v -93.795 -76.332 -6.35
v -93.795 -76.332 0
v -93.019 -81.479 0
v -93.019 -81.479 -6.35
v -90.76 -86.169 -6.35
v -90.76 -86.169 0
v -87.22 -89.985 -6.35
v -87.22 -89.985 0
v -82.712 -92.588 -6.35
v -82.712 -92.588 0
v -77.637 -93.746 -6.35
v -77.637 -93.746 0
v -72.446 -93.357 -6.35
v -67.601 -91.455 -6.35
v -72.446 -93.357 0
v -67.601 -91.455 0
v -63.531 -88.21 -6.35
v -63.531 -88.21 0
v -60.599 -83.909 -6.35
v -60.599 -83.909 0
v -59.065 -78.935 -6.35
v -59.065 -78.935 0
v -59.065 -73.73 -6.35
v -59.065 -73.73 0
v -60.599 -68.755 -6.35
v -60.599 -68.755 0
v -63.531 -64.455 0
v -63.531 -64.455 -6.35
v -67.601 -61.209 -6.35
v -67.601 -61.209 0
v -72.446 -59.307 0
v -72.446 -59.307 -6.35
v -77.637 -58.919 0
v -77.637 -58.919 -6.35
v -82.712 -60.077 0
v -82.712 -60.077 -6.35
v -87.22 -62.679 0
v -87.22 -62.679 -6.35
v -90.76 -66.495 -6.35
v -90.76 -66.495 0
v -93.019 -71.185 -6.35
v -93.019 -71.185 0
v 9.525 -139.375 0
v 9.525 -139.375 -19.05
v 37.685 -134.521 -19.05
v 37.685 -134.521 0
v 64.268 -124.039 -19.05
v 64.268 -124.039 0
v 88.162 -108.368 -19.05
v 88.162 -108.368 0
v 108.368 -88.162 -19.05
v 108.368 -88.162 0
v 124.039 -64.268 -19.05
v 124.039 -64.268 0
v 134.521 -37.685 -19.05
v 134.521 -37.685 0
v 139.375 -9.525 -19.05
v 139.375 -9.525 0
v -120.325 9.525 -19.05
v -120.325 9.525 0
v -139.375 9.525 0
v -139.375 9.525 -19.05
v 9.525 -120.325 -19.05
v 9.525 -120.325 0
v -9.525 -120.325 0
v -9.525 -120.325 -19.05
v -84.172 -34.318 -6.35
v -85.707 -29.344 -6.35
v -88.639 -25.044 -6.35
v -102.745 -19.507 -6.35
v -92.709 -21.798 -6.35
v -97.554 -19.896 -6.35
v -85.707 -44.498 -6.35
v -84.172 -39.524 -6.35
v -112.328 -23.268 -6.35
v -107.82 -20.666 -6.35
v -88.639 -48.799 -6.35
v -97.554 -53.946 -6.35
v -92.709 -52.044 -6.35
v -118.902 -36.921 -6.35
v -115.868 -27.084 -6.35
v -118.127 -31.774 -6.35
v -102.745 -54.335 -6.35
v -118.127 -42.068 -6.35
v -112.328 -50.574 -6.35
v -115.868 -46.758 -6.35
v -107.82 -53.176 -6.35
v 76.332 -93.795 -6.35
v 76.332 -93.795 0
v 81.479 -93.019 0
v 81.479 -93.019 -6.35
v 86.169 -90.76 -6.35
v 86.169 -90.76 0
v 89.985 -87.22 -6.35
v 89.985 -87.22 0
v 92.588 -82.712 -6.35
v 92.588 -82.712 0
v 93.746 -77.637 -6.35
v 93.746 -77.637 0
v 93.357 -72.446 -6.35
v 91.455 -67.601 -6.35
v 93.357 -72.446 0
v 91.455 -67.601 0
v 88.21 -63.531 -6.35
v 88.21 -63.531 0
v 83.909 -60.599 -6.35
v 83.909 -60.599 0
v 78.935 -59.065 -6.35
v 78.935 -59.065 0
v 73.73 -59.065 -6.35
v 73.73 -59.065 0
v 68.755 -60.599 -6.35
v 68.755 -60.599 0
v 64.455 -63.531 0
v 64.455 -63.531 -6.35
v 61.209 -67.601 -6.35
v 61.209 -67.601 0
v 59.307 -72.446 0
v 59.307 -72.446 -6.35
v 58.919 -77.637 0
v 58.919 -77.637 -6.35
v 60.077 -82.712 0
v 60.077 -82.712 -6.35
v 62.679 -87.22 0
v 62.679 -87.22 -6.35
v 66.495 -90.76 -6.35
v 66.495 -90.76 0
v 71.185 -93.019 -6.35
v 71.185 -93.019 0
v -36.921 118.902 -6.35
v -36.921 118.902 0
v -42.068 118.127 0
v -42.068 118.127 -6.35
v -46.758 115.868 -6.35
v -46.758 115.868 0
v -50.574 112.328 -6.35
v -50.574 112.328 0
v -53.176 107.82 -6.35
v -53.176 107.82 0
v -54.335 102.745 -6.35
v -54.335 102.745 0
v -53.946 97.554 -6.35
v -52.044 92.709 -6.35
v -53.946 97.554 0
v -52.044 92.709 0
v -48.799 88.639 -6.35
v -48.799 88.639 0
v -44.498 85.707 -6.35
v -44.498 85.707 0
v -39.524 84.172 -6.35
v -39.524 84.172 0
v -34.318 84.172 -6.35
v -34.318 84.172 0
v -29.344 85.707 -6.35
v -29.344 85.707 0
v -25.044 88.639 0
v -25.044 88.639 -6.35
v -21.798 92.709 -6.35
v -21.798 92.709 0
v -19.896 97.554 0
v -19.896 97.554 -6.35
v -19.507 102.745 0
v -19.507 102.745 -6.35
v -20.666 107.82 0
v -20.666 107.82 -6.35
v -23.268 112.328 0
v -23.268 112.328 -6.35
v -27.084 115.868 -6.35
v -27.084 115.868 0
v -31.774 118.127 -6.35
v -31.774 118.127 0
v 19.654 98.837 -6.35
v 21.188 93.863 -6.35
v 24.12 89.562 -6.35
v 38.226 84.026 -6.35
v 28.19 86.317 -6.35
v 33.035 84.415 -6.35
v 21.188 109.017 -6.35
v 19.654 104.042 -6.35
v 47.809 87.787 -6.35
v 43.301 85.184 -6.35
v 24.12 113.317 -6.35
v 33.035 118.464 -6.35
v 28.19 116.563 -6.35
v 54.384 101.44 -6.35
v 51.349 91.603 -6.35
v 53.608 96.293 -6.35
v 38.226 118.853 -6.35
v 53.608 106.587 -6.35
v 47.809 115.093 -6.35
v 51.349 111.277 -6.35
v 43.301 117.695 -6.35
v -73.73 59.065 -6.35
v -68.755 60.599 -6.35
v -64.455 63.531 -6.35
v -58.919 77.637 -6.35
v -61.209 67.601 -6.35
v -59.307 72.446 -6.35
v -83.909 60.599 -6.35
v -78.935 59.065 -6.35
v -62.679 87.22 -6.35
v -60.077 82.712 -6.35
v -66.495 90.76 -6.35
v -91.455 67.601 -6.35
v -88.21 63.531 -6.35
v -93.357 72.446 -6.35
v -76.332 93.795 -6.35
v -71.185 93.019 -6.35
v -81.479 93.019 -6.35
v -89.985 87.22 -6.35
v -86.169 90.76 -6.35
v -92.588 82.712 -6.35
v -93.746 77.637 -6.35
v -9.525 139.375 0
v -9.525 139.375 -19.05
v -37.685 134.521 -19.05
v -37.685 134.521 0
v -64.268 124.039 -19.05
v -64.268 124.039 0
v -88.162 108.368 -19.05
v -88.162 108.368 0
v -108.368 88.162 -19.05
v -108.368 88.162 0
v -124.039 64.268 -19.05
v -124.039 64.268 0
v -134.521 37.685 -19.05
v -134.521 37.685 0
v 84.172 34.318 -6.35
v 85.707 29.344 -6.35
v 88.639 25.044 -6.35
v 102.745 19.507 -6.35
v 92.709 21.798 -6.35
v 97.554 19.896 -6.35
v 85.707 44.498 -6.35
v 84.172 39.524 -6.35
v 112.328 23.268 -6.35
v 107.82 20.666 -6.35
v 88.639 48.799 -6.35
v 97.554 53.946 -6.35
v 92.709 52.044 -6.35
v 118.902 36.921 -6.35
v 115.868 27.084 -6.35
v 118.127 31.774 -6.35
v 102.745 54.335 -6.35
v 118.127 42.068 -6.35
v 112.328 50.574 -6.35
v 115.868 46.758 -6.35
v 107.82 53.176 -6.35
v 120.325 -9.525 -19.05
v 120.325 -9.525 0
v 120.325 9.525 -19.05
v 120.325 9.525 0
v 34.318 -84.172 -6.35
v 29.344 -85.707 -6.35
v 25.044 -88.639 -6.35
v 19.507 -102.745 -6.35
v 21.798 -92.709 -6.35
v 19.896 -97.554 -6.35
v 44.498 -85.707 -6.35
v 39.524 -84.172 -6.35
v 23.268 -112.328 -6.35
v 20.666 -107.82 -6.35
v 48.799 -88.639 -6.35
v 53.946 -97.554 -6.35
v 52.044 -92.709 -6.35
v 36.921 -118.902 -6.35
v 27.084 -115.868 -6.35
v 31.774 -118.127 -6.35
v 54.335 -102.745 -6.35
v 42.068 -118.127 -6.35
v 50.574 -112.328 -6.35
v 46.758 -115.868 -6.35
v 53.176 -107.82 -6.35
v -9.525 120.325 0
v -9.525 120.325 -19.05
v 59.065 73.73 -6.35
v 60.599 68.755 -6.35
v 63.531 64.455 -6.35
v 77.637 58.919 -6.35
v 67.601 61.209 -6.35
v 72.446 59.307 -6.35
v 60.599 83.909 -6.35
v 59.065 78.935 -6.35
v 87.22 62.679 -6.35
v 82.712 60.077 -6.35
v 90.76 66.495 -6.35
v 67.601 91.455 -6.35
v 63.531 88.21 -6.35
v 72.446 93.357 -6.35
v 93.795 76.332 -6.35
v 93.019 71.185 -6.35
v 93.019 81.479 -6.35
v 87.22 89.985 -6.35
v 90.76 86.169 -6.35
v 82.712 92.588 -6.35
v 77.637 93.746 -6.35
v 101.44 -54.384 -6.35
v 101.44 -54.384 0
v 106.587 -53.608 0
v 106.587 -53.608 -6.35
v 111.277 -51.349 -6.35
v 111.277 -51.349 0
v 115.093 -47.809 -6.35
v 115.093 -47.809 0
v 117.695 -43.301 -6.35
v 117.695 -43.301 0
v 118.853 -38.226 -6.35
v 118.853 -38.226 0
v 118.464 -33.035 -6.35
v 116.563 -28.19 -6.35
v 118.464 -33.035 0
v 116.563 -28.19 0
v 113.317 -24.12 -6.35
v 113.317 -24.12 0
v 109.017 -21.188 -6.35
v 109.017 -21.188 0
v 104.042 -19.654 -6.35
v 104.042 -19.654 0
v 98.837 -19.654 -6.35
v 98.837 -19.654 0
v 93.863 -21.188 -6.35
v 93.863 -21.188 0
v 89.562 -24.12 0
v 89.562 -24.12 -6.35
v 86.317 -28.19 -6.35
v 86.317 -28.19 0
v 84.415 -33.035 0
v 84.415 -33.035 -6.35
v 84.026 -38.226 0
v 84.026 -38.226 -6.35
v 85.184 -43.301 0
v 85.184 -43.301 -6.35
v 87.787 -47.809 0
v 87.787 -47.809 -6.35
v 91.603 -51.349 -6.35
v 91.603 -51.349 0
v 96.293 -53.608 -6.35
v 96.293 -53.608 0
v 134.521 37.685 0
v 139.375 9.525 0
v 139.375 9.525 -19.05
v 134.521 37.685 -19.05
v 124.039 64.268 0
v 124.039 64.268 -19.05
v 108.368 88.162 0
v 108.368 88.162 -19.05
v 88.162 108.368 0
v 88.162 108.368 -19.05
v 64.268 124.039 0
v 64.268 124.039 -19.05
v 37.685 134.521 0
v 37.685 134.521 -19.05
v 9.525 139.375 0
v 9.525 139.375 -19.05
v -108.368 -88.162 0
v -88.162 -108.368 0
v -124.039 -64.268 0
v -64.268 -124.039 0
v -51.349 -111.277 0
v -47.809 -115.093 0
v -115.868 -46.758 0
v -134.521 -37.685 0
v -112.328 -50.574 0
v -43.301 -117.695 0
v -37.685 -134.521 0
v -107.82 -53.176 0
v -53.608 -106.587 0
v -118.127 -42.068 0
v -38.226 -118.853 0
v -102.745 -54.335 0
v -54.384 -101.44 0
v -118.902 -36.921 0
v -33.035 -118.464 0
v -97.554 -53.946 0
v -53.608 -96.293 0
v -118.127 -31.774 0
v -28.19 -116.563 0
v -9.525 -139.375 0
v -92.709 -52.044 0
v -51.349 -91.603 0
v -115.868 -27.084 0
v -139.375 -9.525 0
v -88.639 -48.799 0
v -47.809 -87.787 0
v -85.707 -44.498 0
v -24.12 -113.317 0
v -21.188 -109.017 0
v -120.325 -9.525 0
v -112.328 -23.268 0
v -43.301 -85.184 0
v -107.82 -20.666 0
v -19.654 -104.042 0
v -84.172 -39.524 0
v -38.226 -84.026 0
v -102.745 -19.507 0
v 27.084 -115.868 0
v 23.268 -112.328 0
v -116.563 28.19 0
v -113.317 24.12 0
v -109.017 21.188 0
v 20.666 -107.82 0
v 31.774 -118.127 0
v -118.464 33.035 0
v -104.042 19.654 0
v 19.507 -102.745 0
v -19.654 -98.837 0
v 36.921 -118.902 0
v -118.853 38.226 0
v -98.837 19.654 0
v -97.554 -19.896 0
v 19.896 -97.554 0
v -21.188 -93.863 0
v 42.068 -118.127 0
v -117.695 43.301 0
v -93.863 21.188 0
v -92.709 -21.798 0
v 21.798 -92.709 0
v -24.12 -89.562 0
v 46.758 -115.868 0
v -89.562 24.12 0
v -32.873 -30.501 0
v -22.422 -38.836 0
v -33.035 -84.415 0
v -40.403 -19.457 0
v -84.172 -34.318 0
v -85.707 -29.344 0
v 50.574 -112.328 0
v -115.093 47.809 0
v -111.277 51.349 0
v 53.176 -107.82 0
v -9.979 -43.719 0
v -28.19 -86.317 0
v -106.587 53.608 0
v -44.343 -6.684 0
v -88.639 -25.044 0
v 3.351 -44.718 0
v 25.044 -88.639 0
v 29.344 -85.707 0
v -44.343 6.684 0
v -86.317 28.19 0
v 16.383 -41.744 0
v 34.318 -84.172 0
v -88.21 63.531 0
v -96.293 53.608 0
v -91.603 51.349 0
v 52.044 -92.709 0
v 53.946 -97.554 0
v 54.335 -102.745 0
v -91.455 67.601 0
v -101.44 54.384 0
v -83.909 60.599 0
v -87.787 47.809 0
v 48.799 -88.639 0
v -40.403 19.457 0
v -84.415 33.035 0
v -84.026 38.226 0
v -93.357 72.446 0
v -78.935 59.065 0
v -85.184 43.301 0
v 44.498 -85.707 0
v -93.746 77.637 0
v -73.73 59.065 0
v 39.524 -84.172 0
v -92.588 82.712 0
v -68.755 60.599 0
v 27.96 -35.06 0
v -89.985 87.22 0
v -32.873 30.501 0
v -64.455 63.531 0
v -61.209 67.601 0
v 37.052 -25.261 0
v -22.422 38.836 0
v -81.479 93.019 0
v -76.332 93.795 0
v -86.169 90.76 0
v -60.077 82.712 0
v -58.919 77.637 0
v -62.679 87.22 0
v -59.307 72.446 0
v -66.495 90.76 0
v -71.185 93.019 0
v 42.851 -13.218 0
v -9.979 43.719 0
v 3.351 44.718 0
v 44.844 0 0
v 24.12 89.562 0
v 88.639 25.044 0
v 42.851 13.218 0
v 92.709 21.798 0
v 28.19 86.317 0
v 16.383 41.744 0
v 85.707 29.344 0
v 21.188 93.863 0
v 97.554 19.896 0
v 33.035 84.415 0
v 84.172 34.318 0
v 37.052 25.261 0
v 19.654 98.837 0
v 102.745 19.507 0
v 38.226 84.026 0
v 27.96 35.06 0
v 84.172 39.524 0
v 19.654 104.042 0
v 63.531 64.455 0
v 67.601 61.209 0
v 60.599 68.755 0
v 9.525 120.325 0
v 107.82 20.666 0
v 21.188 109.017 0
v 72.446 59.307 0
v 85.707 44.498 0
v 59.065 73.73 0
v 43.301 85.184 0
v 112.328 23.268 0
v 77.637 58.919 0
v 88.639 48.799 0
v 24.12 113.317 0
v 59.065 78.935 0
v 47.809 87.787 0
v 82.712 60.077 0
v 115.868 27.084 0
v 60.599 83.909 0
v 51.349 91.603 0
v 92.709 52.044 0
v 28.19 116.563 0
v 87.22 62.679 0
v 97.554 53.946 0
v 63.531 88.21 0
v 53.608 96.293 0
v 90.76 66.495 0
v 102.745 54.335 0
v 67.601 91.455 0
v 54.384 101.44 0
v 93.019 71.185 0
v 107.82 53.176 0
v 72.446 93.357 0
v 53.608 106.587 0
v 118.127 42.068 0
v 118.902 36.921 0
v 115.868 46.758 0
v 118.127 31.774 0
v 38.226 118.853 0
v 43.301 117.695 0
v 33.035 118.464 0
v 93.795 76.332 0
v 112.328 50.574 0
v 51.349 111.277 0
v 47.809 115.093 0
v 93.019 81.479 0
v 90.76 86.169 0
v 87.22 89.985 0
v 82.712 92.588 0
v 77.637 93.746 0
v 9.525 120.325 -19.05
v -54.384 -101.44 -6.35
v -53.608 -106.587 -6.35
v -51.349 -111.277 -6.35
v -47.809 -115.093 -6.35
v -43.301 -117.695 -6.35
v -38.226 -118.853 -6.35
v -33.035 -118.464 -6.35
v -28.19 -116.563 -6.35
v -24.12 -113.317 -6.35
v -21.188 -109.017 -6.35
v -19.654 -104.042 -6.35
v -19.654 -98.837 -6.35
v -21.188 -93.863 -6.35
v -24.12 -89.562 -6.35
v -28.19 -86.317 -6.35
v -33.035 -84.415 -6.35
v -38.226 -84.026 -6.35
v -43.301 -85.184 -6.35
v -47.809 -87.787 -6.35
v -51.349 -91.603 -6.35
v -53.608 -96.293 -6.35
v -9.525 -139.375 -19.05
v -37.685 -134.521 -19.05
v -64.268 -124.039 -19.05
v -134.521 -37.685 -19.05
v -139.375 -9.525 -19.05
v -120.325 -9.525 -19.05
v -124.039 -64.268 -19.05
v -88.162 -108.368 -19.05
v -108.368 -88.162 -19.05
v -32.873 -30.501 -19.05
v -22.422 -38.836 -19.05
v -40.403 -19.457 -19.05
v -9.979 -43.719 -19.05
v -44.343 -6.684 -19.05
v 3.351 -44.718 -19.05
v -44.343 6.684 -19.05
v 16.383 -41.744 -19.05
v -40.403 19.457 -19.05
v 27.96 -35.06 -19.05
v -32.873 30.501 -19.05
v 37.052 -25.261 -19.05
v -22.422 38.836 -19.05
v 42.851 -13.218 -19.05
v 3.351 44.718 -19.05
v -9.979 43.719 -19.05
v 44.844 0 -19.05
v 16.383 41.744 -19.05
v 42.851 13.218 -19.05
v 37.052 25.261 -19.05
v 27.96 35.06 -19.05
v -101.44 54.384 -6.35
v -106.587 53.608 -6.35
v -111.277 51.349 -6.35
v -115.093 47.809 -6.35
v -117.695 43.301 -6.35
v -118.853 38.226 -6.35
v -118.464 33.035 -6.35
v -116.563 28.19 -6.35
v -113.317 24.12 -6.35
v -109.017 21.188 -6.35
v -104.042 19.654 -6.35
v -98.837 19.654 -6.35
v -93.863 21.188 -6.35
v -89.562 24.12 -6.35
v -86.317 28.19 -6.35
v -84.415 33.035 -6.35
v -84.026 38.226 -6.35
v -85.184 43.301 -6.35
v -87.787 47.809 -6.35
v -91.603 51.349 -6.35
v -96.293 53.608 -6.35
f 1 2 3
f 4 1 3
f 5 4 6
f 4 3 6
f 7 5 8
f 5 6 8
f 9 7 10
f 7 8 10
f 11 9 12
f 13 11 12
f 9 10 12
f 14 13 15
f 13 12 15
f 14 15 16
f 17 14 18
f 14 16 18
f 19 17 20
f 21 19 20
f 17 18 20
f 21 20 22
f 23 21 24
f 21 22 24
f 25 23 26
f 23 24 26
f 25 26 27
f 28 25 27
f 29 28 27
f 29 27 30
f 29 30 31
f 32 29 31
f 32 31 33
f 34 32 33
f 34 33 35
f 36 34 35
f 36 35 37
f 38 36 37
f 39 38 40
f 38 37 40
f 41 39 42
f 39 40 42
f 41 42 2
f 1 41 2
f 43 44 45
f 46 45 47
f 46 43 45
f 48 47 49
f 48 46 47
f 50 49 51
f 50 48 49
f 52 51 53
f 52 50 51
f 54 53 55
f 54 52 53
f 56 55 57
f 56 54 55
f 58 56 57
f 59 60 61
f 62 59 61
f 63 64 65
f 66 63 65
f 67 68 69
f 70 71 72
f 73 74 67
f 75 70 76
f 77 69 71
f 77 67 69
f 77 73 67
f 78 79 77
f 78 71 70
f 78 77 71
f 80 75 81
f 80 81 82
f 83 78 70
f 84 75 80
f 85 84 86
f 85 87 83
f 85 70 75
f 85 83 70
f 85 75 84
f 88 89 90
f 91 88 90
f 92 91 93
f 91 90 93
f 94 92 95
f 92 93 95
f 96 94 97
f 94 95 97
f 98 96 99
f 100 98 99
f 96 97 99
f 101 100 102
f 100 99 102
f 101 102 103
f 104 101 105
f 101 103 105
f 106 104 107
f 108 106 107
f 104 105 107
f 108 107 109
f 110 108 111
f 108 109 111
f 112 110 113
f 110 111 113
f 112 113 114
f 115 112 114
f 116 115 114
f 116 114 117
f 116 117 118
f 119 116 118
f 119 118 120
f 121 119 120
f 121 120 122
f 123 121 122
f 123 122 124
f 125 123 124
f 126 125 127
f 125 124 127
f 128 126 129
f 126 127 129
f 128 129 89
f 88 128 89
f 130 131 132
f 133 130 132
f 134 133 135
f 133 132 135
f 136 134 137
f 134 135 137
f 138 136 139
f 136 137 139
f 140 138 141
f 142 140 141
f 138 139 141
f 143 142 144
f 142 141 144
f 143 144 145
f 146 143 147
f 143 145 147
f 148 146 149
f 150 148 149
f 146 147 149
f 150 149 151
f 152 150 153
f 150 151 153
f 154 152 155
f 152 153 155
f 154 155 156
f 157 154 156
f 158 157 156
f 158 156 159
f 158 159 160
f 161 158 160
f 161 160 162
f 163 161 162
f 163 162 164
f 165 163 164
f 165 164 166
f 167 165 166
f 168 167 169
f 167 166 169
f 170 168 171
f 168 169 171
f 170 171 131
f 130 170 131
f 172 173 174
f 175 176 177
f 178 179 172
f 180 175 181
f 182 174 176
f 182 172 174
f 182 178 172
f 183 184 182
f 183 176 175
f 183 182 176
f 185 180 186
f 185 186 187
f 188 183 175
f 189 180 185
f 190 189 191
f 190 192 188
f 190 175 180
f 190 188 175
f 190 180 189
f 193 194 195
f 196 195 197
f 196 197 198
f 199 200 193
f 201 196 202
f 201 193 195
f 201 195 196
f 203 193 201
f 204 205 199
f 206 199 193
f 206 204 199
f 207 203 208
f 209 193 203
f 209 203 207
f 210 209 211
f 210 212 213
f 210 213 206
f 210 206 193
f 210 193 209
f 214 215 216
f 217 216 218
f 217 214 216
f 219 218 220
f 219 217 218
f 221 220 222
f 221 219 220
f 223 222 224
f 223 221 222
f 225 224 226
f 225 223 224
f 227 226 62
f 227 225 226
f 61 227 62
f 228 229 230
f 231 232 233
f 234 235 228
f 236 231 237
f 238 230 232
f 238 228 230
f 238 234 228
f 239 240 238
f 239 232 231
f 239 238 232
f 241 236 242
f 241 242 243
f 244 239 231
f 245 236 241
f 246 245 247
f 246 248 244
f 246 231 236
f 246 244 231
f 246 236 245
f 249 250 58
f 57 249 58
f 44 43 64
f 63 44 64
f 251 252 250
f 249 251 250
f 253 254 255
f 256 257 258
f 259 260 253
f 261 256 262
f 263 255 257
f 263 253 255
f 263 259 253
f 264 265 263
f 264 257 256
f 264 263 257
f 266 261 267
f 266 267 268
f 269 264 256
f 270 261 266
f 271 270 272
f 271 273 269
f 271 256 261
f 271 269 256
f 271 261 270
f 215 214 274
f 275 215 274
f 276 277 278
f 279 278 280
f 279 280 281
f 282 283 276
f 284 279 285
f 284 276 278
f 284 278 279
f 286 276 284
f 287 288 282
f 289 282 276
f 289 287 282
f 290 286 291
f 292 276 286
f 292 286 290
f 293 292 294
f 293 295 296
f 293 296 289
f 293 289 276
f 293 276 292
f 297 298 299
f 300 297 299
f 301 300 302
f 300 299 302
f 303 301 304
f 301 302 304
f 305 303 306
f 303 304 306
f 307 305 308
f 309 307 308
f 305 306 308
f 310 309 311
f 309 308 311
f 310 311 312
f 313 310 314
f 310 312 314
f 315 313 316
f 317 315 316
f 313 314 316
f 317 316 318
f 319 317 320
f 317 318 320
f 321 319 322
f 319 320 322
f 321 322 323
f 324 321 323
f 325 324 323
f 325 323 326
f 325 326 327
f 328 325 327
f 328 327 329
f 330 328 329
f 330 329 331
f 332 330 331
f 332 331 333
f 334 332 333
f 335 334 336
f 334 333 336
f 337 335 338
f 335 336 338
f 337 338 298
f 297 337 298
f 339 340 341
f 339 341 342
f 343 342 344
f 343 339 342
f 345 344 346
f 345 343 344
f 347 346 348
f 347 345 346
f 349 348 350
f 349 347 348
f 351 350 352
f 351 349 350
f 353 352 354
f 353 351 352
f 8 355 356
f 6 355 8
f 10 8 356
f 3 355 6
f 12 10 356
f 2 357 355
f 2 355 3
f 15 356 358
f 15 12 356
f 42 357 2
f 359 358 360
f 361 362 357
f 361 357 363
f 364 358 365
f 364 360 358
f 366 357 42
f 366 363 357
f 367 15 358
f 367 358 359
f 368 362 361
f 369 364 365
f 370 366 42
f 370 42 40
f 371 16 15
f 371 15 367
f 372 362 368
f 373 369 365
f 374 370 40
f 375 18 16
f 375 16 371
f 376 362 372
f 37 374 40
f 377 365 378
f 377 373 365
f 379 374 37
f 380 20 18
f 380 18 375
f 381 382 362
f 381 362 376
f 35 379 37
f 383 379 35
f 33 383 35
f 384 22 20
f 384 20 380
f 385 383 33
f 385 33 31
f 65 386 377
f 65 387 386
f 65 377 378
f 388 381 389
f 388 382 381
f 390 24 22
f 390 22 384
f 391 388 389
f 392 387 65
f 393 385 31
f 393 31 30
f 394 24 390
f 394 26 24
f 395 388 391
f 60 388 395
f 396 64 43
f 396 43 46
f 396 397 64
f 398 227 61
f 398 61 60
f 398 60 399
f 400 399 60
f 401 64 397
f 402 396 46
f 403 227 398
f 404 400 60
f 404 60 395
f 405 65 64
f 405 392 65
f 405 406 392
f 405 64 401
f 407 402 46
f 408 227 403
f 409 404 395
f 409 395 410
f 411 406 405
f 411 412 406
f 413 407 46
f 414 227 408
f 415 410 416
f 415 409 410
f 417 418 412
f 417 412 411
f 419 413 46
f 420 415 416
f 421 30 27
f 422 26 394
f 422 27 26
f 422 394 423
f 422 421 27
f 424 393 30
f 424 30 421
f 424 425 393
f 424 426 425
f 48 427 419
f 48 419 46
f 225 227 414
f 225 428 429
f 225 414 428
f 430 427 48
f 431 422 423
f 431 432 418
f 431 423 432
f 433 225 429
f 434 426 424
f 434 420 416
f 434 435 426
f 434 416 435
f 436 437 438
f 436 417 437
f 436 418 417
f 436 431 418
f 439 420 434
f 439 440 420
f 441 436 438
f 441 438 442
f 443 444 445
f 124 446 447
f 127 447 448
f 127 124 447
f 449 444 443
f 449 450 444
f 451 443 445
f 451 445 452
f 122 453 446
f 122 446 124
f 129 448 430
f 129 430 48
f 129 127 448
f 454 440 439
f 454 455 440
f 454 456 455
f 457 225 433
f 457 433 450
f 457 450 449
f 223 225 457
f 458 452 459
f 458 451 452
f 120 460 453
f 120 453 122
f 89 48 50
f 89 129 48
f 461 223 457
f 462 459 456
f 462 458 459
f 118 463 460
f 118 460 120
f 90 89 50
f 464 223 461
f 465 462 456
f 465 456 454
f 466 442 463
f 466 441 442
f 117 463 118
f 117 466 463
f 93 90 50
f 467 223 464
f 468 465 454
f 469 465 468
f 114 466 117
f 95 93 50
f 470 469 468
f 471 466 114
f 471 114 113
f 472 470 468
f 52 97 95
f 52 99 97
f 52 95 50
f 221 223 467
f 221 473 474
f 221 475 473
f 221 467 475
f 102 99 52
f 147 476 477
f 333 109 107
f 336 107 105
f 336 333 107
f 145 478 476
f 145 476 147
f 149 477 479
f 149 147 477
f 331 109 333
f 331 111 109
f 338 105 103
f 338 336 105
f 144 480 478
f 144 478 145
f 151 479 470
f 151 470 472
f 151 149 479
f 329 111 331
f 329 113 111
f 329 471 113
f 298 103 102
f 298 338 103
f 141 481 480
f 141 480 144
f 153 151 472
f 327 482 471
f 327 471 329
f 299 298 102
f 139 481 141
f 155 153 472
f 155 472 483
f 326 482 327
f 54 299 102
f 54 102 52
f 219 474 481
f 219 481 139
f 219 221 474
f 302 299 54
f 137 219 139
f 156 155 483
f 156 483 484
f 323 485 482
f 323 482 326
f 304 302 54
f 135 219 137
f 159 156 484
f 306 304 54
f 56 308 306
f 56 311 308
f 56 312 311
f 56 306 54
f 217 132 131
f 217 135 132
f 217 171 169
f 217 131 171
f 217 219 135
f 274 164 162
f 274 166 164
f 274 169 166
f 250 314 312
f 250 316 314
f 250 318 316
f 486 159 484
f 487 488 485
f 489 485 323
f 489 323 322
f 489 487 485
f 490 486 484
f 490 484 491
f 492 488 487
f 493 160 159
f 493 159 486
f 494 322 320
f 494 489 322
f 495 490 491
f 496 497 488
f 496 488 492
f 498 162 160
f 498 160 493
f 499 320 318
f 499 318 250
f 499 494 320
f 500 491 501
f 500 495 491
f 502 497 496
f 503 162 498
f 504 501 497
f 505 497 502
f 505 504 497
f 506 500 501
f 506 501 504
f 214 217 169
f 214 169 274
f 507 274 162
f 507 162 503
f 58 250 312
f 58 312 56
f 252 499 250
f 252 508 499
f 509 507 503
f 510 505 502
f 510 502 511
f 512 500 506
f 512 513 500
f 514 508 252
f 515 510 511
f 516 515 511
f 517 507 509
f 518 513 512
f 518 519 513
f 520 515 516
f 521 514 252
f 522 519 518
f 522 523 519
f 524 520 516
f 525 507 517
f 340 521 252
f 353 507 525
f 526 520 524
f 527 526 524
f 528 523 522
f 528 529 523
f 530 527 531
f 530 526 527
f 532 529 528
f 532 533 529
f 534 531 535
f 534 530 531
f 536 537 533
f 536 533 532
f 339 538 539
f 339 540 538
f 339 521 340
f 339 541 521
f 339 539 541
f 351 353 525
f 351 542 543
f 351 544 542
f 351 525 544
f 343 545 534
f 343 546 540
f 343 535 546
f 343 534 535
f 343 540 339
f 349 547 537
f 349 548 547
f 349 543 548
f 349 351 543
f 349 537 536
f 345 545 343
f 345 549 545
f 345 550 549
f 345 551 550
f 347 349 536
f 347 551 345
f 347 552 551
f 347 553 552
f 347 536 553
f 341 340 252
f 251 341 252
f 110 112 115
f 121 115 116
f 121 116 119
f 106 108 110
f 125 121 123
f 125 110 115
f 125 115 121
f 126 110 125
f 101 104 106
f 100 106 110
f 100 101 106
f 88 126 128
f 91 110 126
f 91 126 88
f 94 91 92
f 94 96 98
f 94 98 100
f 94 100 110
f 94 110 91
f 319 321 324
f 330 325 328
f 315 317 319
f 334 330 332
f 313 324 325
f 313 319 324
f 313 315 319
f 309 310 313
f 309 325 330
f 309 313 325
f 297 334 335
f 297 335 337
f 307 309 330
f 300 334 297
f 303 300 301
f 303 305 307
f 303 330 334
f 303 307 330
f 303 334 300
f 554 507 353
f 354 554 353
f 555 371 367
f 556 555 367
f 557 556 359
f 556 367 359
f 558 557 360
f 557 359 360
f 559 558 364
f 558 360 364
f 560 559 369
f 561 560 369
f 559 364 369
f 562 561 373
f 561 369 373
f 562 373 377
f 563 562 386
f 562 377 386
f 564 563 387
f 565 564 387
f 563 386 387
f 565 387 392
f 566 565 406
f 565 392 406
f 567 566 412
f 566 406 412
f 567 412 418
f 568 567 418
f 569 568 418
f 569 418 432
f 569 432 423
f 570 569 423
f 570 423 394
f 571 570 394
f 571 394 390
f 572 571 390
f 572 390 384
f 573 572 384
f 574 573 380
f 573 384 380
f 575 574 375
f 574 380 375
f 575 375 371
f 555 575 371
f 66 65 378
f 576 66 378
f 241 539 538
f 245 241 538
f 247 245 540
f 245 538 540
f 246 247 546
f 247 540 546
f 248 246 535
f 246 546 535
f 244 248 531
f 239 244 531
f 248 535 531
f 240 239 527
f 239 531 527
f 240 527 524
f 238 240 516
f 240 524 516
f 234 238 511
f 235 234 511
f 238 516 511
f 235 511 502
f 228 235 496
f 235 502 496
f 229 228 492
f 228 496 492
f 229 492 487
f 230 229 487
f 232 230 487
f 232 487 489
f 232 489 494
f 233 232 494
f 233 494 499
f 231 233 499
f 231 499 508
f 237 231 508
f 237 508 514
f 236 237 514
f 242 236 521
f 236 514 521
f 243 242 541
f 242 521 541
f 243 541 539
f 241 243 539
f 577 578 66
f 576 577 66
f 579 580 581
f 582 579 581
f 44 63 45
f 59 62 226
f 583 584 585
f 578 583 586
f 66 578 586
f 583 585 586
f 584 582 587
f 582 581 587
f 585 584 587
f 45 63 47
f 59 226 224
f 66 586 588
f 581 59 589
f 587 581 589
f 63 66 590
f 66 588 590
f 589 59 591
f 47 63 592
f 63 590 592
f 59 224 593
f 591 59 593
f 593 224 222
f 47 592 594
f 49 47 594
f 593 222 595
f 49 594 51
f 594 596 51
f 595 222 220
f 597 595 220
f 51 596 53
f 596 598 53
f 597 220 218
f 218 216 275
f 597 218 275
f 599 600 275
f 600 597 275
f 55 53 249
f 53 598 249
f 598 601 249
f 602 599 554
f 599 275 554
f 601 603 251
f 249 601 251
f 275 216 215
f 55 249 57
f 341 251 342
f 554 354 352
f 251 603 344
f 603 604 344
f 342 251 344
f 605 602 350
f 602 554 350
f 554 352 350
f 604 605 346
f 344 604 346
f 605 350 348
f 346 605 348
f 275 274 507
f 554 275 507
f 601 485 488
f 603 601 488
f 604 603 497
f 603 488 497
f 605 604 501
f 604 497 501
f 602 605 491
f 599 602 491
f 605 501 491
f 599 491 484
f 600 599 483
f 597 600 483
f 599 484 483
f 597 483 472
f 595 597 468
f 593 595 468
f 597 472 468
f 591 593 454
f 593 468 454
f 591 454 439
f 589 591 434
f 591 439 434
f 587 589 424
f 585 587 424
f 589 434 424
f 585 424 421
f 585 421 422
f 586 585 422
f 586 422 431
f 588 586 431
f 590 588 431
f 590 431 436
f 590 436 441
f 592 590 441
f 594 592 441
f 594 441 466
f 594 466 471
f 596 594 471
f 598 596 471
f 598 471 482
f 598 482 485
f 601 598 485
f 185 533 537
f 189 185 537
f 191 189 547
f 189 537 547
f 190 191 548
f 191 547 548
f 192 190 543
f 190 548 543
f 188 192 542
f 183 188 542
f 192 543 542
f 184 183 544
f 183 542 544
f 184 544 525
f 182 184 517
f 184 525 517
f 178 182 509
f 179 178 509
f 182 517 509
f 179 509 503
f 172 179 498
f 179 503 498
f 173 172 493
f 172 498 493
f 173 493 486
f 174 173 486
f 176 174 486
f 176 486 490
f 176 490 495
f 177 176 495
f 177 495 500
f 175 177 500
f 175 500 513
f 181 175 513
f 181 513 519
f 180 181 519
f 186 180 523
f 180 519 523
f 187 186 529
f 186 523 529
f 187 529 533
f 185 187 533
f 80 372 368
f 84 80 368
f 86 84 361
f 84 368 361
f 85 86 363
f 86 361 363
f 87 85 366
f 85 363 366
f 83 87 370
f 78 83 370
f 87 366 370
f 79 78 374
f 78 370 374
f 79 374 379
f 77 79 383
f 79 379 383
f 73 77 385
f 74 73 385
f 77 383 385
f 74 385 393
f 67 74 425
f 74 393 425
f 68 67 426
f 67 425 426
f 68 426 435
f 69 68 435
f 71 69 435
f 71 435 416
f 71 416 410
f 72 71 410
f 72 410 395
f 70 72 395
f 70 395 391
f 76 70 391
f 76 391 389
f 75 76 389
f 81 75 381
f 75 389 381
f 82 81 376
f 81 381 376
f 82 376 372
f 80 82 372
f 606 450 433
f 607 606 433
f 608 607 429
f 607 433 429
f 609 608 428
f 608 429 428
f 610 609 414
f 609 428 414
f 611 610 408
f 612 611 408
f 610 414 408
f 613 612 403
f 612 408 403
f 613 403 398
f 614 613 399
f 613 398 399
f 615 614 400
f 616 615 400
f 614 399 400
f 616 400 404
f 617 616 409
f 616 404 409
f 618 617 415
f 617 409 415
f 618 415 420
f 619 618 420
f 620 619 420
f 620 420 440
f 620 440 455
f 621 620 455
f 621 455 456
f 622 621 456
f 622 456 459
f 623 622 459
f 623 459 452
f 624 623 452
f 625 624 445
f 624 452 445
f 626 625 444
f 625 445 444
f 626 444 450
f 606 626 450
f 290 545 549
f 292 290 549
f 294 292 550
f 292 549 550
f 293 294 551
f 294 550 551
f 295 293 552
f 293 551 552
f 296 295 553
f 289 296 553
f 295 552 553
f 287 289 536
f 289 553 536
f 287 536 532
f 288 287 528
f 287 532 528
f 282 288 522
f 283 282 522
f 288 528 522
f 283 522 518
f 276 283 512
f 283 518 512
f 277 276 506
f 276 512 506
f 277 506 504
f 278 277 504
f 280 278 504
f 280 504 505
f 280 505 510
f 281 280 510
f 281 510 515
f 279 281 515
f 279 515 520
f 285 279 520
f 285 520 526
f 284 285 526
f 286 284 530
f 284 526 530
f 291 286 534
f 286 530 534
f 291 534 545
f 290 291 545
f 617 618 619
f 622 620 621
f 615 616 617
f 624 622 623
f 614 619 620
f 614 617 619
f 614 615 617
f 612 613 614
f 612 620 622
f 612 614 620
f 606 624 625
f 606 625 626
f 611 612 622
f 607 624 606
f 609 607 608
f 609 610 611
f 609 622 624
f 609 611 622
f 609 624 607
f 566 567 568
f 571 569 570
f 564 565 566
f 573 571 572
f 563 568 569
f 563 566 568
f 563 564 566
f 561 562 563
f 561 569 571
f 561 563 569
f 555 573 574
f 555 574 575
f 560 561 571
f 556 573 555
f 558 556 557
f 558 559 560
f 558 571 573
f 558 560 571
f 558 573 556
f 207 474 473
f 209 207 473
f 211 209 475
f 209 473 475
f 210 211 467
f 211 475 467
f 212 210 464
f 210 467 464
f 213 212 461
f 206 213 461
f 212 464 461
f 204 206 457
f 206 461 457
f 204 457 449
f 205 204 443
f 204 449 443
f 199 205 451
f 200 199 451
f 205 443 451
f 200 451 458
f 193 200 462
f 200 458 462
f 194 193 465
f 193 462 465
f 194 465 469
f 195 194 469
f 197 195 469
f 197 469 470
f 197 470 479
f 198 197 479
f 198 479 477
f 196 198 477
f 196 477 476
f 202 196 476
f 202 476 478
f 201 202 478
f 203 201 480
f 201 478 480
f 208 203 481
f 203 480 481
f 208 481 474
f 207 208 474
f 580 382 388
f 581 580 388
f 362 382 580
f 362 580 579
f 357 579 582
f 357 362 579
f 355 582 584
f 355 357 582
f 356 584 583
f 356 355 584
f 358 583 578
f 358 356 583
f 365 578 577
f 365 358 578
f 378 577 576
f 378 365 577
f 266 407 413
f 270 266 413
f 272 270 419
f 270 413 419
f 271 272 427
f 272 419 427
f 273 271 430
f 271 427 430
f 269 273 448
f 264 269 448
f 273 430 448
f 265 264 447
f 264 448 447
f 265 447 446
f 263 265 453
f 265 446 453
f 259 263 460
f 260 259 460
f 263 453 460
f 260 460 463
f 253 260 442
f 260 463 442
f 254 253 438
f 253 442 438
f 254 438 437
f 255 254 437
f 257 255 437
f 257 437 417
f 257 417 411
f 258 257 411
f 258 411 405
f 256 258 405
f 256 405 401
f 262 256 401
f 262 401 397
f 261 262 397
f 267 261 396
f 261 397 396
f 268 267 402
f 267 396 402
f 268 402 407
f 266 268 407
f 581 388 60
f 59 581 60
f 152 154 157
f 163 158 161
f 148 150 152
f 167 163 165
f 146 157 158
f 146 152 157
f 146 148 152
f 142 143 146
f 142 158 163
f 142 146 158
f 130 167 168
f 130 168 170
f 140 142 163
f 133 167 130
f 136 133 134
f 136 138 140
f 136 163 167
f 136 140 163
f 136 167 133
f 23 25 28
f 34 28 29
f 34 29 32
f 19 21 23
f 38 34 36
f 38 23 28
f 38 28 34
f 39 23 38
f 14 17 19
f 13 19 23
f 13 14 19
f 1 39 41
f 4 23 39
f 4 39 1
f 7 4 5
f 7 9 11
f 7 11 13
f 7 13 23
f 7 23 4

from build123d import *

# Parameters (mm, degrees)
F0_R            = 44.8437
F0_R_2          = 17.4625
F0_W            = 19.05
F0_H            = 6.35
F1_DEPTH        = 19.05
F2_DEPTH        = 6.35
F2_COPIES_COUNT = 4
F3_DEPTH        = 19.051
F3_COPIES_COUNT = 4
F5_DEPTH        = 25.4


# Not quite as in the source:
# - a pattern or mirror of a feature is missing from the dataset's text; its kind, count and spacing are read off the source's solid


with BuildPart() as f1:
    # F0 (on Top) → F1 (new body)
    with BuildSketch(Plane.XY):
        with BuildLine():
            ThreePointArc((-9.525, 139.3749058296), (-95.3557746023, -102.0948884617), (139.7, 0))
            ThreePointArc((139.7, 0), (102.0948884617, 95.3557746023), (9.525, 139.3749058296))
            Line((9.525, 139.3749058296), (9.525, 120.3249058296))
            Line((9.525, 120.3249058296), (9.525, 113.9749058296))
            Line((9.525, 113.9749058296), (-9.525, 113.9749058296))
            Line((-9.525, 113.9749058296), (-9.525, 120.3249058296))
            Line((-9.525, 120.3249058296), (-9.525, 139.3749058296))
        make_face()
        Circle(F0_R, mode=Mode.SUBTRACT)
        with Locations((101.4398184138, 36.921074472)):
            Circle(F0_R_2, mode=Mode.SUBTRACT)
        with Locations((36.921074472, 101.4398184138)):
            Circle(F0_R_2, mode=Mode.SUBTRACT)
        with Locations((76.3321770291, 76.3321770291)):
            Circle(F0_R_2, mode=Mode.SUBTRACT)
        with BuildLine():
            Line((9.525, 120.3249058296), (9.525, 139.3749058296))
            ThreePointArc((9.525, 139.3749058296), (0, 139.7), (-9.525, 139.3749058296))
            Line((-9.525, 139.3749058296), (-9.525, 120.3249058296))
            Line((-9.525, 120.3249058296), (9.525, 120.3249058296))
        make_face()
        with Locations((36.921074472, 101.4398184138)):
            Circle(F0_R_2)
        with Locations((76.3321770291, 76.3321770291)):
            Circle(F0_R_2)
        with Locations((101.4398184138, 36.921074472)):
            Circle(F0_R_2)
        with Locations((0, 117.1499058296)):
            Rectangle(F0_W, F0_H)
        Circle(F0_R)
    extrude(amount=-F1_DEPTH)

    # F0 (on Top) → F2 (cut)
    with BuildSketch(Plane.XY):
        with Locations((36.921074472, 101.4398184138)):
            Circle(F0_R_2)
        with Locations((76.3321770291, 76.3321770291)):
            Circle(F0_R_2)
        with Locations((101.4398184138, 36.921074472)):
            Circle(F0_R_2)
    f2 = extrude(amount=-F2_DEPTH, mode=Mode.SUBTRACT)

    # F2_copies: F2 ×4 about axis
    f2_copies_axis = Axis((0, 0, 0), (0, 0, 1))
    for i in range(1, F2_COPIES_COUNT):
        add(f2.rotate(f2_copies_axis, i * 360 / F2_COPIES_COUNT), mode=Mode.SUBTRACT)

    # F0 (on Top) → F3 (cut, through all)
    with BuildSketch(Plane.XY):
        with BuildLine():
            Line((9.525, 120.3249058296), (9.525, 139.3749058296))
            ThreePointArc((9.525, 139.3749058296), (0, 139.7), (-9.525, 139.3749058296))
            Line((-9.525, 139.3749058296), (-9.525, 120.3249058296))
            Line((-9.525, 120.3249058296), (9.525, 120.3249058296))
        make_face()
    f3 = extrude(amount=-F3_DEPTH, mode=Mode.SUBTRACT)

    # F3_copies: F3 ×4 about axis
    f3_copies_axis = Axis((0, 0, 0), (0, 0, 1))
    for i in range(1, F3_COPIES_COUNT):
        add(f3.rotate(f3_copies_axis, i * 360 / F3_COPIES_COUNT), mode=Mode.SUBTRACT)

    # F0 (on Top) → F5 (cut)
    with BuildSketch(Plane.XY):
        Circle(F0_R)
    extrude(amount=-F5_DEPTH, mode=Mode.SUBTRACT)


solid = f1.part
